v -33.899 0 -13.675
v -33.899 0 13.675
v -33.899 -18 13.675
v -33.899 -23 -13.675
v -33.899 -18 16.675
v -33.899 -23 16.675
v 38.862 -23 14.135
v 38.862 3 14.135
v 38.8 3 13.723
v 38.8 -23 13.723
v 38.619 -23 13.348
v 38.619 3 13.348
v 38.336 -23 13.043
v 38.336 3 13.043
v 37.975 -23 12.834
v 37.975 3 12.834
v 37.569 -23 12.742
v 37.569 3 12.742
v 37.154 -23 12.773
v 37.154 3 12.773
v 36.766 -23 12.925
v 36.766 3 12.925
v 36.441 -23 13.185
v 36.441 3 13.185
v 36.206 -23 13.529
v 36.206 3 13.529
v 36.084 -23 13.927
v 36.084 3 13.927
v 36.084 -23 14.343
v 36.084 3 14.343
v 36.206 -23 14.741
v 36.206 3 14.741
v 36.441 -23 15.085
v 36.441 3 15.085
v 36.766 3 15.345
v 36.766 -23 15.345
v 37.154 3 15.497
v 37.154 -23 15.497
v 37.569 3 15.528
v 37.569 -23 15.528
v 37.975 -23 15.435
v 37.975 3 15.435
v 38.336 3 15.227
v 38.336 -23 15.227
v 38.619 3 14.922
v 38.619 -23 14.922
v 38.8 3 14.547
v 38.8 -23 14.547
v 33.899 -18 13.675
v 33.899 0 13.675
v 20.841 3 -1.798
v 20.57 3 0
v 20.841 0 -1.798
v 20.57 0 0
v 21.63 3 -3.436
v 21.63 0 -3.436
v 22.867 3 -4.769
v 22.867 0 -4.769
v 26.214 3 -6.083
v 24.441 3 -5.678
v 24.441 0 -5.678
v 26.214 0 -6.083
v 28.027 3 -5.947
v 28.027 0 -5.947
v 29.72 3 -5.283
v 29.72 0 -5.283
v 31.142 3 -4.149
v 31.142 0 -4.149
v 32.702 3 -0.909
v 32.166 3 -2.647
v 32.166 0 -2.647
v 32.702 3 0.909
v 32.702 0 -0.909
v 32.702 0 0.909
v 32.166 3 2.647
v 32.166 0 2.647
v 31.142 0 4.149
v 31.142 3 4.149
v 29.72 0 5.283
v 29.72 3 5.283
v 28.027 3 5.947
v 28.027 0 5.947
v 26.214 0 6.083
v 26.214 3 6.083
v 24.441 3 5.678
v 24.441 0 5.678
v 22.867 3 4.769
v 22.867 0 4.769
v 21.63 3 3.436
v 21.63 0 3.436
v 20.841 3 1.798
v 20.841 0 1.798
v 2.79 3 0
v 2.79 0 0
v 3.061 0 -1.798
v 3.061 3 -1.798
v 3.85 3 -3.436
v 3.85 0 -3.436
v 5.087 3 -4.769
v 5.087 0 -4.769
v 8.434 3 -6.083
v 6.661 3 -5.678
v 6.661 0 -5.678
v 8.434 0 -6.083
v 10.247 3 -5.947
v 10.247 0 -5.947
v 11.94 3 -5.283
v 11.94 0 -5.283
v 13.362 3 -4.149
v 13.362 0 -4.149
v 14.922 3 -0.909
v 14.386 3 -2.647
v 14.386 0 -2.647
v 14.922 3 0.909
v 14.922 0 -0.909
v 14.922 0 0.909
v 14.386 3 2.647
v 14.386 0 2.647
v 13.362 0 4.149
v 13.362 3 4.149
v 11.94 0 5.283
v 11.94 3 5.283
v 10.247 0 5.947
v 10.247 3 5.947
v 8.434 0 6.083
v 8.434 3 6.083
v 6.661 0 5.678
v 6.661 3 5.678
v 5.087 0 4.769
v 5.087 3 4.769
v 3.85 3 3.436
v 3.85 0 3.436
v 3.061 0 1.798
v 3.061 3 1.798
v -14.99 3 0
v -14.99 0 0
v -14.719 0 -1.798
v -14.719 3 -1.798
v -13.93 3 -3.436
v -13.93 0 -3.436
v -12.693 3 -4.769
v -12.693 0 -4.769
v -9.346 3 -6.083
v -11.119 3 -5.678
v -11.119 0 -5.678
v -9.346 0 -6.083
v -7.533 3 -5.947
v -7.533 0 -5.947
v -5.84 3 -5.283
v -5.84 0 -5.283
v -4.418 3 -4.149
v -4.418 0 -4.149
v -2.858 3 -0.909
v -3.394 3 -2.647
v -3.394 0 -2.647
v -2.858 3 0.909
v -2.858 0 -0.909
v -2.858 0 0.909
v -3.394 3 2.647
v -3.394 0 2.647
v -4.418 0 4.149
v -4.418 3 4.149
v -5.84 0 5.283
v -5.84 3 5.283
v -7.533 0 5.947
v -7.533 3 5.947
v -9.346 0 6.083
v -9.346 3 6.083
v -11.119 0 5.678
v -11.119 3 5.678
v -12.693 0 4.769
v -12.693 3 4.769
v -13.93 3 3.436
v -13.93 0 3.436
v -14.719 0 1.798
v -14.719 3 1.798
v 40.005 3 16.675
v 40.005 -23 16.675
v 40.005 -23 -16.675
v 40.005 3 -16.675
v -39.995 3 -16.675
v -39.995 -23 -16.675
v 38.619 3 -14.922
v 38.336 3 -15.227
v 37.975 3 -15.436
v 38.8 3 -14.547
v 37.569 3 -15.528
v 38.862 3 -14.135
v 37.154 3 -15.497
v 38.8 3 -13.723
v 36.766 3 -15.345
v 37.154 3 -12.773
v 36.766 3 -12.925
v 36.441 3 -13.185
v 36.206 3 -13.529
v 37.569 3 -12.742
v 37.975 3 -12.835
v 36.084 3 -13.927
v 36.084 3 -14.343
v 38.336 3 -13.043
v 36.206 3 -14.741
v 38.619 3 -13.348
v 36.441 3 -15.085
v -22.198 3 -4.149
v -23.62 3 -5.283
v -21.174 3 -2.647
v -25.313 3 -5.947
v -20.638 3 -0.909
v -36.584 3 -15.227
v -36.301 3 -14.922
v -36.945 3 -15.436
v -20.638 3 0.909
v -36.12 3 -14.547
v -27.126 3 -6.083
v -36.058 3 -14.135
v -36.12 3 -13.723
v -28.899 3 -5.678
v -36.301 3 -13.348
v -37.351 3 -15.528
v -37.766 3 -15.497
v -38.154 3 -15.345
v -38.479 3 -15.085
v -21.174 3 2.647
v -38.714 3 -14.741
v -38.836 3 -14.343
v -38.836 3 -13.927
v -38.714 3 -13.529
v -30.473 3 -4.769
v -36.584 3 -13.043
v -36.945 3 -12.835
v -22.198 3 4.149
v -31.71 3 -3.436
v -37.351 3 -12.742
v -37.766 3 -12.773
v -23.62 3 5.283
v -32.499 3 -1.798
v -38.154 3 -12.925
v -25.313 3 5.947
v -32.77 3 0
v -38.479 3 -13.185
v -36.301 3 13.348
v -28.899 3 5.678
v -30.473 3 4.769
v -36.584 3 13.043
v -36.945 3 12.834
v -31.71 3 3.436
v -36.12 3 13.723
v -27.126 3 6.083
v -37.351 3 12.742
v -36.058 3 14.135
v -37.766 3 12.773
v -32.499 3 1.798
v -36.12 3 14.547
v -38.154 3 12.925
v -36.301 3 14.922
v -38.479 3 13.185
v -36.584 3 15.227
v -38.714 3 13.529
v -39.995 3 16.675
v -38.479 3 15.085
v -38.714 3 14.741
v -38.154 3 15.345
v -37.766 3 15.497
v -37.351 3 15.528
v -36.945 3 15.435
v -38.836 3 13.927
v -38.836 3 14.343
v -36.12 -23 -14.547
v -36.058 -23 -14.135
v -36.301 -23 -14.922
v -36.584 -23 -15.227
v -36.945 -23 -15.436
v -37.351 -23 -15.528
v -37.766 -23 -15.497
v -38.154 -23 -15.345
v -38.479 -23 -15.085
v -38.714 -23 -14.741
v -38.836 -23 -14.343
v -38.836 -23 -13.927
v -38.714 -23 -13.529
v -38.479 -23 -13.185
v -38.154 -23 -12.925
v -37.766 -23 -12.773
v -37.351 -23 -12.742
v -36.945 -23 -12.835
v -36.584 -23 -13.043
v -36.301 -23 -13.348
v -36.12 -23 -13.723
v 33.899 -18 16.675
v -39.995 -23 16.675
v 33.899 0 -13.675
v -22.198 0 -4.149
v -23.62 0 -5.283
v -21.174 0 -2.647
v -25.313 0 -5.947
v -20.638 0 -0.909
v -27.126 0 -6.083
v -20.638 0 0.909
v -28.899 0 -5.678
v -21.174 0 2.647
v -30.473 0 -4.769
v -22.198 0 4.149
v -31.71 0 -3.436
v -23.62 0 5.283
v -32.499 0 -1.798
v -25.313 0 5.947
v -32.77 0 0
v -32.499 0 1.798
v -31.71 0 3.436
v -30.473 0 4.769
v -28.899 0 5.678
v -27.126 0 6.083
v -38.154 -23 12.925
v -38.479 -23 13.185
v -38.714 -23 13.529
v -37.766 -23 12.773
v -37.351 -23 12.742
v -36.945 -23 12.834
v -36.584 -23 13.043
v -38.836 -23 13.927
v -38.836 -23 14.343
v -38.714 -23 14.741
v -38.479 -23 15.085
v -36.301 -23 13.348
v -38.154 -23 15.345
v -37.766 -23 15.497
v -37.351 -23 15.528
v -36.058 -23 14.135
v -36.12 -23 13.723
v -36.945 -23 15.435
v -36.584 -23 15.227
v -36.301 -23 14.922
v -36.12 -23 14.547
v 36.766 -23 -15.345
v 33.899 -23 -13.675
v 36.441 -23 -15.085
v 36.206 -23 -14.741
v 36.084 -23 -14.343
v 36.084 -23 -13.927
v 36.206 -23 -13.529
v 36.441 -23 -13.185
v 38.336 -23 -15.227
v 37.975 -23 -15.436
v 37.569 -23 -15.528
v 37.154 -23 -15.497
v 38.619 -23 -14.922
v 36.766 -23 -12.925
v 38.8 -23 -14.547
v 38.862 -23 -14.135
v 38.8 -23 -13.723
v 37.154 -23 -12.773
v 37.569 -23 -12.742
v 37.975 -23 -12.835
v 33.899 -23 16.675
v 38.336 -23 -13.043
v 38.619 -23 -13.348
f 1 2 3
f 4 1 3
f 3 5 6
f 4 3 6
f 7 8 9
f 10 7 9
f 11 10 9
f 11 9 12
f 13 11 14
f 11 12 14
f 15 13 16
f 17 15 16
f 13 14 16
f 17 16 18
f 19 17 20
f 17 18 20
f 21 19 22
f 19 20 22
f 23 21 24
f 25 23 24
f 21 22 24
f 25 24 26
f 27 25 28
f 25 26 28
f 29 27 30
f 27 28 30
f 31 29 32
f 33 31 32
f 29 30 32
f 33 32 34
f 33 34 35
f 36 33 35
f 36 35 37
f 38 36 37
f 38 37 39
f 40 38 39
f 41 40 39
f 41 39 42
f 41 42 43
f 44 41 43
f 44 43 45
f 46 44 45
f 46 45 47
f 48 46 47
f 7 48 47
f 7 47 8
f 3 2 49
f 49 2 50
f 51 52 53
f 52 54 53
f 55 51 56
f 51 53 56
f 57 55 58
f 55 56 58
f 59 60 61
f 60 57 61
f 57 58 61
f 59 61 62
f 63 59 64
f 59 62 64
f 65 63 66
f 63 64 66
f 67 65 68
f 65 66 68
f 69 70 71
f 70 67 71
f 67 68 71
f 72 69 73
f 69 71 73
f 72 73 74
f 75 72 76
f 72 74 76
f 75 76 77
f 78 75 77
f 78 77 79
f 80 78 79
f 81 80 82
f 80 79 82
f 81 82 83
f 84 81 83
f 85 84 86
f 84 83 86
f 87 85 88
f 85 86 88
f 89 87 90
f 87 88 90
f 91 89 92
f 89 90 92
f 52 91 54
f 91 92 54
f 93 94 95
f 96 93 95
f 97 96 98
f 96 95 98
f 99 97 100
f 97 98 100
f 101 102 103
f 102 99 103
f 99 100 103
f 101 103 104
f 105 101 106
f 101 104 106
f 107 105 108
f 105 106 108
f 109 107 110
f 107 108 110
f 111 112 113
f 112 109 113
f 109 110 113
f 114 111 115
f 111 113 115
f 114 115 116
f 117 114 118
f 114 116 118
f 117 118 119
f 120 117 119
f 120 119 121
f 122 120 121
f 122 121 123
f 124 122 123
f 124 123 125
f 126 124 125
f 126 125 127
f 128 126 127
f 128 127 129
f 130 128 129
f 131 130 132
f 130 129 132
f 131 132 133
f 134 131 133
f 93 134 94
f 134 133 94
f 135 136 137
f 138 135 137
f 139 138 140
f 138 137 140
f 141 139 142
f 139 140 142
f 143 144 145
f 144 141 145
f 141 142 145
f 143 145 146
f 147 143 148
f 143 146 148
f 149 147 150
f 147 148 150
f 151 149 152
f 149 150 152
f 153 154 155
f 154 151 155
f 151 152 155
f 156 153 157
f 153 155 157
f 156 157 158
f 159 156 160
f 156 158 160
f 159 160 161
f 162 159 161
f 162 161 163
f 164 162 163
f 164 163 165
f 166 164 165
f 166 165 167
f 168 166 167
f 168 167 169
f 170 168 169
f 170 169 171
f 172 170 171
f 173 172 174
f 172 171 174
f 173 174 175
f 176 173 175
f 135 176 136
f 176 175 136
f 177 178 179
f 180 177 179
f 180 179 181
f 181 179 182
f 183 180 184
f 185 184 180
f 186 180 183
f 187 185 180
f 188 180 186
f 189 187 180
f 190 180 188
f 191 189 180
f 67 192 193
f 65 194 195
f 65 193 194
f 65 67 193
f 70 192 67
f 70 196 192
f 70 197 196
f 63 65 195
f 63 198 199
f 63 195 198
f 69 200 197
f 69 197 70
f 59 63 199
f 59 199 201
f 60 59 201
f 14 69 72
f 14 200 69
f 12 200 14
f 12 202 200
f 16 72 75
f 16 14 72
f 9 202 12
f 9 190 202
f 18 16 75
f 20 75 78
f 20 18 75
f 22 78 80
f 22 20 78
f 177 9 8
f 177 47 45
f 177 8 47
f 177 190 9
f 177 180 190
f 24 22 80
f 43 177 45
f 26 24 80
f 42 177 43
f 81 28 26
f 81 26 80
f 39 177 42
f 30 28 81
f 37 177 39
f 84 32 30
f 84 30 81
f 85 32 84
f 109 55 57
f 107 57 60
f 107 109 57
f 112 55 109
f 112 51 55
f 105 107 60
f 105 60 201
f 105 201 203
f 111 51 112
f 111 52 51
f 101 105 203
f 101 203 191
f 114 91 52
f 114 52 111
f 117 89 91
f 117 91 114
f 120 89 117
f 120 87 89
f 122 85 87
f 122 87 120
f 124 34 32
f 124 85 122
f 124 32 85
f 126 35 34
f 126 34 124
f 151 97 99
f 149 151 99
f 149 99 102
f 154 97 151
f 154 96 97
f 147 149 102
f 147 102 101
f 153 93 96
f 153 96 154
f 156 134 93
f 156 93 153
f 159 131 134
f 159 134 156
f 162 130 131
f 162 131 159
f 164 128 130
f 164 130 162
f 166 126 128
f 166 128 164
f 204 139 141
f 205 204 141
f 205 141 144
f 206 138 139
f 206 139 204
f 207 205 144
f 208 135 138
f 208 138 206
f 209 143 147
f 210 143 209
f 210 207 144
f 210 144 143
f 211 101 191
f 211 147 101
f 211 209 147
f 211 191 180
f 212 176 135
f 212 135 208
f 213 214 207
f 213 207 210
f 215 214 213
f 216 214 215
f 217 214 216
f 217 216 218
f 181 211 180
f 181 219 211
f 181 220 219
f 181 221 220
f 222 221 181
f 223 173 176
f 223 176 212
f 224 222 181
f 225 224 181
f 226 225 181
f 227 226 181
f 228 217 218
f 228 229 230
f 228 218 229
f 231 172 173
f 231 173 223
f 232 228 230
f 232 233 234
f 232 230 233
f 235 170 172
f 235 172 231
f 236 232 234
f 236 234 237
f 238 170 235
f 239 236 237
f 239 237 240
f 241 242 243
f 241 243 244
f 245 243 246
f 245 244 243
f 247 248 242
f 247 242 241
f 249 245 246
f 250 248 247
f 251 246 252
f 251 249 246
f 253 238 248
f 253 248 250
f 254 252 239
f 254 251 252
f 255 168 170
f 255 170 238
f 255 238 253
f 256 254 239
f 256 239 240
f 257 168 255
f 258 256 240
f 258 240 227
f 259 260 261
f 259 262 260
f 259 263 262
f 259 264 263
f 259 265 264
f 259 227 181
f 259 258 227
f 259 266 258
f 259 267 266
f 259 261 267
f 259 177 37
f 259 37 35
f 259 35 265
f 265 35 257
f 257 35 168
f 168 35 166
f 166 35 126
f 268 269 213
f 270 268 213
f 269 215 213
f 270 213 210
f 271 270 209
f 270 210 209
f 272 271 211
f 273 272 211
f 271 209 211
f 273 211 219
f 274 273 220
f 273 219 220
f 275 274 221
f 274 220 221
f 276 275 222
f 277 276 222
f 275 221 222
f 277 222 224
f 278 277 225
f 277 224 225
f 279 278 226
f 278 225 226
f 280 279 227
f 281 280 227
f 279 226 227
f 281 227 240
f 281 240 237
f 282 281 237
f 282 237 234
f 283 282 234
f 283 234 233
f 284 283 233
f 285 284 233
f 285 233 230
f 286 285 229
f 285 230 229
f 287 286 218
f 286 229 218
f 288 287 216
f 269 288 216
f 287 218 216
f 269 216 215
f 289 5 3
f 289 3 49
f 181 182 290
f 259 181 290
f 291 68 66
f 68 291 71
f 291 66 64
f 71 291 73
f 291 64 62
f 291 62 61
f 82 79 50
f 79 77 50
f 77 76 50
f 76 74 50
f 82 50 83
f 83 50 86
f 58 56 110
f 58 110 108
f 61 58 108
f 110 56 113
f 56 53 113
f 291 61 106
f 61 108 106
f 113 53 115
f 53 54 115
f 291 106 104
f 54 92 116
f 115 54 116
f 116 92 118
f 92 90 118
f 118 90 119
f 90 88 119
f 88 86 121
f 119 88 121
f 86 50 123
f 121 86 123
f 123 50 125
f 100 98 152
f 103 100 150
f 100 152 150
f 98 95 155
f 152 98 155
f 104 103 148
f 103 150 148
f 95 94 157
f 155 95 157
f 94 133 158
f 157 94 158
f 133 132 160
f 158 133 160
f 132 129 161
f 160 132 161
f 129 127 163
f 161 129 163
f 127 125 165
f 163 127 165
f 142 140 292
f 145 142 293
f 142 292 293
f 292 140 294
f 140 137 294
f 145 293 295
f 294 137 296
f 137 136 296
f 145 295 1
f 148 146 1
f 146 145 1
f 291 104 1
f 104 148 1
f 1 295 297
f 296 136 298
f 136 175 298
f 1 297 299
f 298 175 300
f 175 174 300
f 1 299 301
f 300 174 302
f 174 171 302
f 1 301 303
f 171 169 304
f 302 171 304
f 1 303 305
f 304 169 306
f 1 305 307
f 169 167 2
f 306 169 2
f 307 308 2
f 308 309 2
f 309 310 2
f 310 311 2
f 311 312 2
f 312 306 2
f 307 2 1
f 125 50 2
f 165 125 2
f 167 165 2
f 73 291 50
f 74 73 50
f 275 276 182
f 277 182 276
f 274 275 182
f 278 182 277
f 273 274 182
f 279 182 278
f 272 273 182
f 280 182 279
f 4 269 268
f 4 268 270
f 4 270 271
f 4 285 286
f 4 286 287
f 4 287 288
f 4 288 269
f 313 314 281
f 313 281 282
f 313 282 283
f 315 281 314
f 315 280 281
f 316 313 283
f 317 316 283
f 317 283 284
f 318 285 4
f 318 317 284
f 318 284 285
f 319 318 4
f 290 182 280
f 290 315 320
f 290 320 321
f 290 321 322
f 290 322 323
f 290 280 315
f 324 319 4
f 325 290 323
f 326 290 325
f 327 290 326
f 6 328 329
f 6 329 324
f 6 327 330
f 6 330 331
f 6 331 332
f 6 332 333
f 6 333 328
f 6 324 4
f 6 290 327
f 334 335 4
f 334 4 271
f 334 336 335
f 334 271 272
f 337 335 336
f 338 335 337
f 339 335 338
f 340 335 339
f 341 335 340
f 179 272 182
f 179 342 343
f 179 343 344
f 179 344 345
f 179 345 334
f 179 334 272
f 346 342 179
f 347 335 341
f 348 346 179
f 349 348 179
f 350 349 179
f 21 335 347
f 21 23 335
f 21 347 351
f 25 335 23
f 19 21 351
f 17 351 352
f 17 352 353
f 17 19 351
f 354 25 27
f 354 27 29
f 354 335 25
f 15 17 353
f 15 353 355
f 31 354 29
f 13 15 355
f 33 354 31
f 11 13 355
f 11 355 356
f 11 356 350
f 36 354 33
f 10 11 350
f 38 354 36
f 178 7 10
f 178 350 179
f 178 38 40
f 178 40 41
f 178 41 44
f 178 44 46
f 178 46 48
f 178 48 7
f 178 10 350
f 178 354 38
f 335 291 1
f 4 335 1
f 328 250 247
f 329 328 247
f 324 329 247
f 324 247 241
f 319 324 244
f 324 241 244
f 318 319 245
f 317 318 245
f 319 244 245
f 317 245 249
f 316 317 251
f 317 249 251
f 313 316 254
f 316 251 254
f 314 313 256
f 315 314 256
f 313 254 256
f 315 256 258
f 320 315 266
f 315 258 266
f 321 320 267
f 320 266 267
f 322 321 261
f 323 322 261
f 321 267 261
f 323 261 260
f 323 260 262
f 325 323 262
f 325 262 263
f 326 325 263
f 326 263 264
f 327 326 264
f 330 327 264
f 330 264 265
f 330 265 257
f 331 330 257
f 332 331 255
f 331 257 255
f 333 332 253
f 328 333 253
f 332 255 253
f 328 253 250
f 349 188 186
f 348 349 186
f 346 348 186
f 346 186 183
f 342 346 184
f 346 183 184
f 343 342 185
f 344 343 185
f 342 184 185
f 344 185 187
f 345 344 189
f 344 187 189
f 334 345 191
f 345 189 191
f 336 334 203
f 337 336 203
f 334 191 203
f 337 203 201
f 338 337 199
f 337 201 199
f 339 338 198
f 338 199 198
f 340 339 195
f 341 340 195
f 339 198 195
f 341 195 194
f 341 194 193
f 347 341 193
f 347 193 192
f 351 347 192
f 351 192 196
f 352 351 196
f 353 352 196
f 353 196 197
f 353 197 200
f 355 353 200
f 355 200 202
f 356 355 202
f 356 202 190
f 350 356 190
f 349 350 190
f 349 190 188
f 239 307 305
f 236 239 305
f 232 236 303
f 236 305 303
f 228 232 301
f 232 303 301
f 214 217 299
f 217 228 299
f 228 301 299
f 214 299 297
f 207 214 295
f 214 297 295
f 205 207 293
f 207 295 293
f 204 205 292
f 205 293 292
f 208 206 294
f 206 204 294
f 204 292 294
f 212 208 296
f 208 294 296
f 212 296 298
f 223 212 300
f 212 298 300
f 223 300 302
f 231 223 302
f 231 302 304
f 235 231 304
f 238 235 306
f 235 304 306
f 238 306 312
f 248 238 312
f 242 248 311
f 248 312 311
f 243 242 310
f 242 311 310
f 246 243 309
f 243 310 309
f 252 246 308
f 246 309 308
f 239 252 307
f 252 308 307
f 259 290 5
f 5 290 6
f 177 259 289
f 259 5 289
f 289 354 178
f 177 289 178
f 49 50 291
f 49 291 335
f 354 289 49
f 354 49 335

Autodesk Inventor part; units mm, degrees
ref_plane "YZ Plane" through (0, 0, 0) normal (1, 0, 0) x (0, 1, 0)
ref_plane "XZ Plane" through (0, 0, 0) normal (0, 1, 0) x (-1, 0, 0)
ref_plane "XY Plane" through (0, 0, 0) normal (0, 0, 1) x (1, 0, 0)
sketch "Sketch1" plane through (0, 0, 0) normal (0, 1, 0) x (-1, 0, 0)
  line L0 (39.995, 16.6749) -> (-40.005, 16.6749)
  line L1 (-40.005, 16.6749) -> (-40.005, -16.6751)
  line L2 (-40.005, -16.6751) -> (39.995, -16.6751)
  line L3 (39.995, -16.6751) -> (39.995, 16.6749)
  circle A0 centre (-26.67, -0.0001) radius 6.1
  circle A1 centre (-8.89, -0.0001) radius 6.1
  circle A2 centre (8.89, -0.0001) radius 6.1
  circle A3 centre (26.67, -0.0001) radius 6.1
  point P0 (0, 0)
  dimension "d0" = 33.35
  dimension "d1" = 80
  dimension "d2" = 16.6751
  dimension "d3" = 40.005
  dimension "d4" = 12.2
  dimension "d5" = 13.335
  dimension "d8" = 17.78
extrude "Extrusion1" add sketch "Sketch1" along normal blind 3
sketch "Sketch2" plane through (0, 0, 0) normal (0, -1, 0) x (1, 0, 0)
  circle A0 centre (-26.67, -0.0001) radius 6.1 projected
  circle A1 centre (-8.89, -0.0001) radius 6.1 projected
  circle A2 centre (8.89, -0.0001) radius 6.1 projected
  circle A3 centre (26.67, -0.0001) radius 6.1 projected
  line L0 (-39.995, -16.6751) -> (-39.995, 16.6749) projected
  line L1 (-39.995, 16.6749) -> (40.005, 16.6749) projected
  line L2 (40.005, 16.6749) -> (40.005, -16.6751) projected
  line L3 (40.005, -16.6751) -> (-39.995, -16.6751) projected
  line L4 (33.899, -13.6749) -> (-33.899, -13.6749)
  line L5 (-33.899, -13.6749) -> (-33.899, 13.6749)
  line L6 (-33.899, 13.6749) -> (33.899, 13.6749)
  line L7 (33.899, 13.6749) -> (33.899, -13.6749)
  line L8 (33.899, -13.6749) -> (-33.899, 13.6749) construction
  line L9 (-33.899, -13.6749) -> (33.899, 13.6749) construction
  point P0 (0, 0)
  dimension "d15" = 6.096
  dimension "d16" = 6.106
  dimension "d17" = 3
  dimension "d18" = 7.229
extrude "Extrusion2" add sketch "Sketch2" along normal blind 23 contours L0 L1 L2 L3
sketch "Sketch4" plane through (-39.995, 3, 16.6749) normal (0, 0, 1) x (1, 0, 0)
  line L0 (80, -26) -> (0, -26) projected
  line L1 (0, -26) -> (0, 0) projected
  line L2 (0, 0) -> (80, 0) projected
  line L3 (80, 0) -> (80, -26) projected
  line L4 (0, 0) -> (80, 0) projected
  line L5 (6.096, 0) -> (6.096, -26)
  line L6 (73.894, 0) -> (73.894, -26)
  line L7 (73.894, -3) -> (73.894, -26) projected
  line L8 (6.096, -21) -> (73.894, -21)
  point P0 (39.995, -3)
  dimension "d21" = 6.096
  dimension "d22" = 6.106
  dimension "d23" = 5
extrude "Extrusion3" cut sketch "Sketch4" against normal blind 23 contours L0 L5 L8 L6
sketch "Sketch5" plane through (0, 3, 0) normal (0, 1, 0) x (1, 0, 0)
  circle A0 centre (-26.67, 0.0001) radius 6.1 projected
  circle A1 centre (-8.89, 0.0001) radius 6.1 projected
  circle A2 centre (8.89, 0.0001) radius 6.1 projected
  circle A3 centre (26.67, 0.0001) radius 6.1 projected
  line L0 (-39.995, -16.6749) -> (-39.995, 16.6751) projected
  line L1 (-39.995, 16.6751) -> (40.005, 16.6751) projected
  line L2 (40.005, 16.6751) -> (40.005, -16.6749) projected
  line L3 (40.005, -16.6749) -> (-39.995, -16.6749) projected
  line L4 (-33.899, 13.6749) -> (-33.899, -16.6749) projected
  line L5 (33.899, -13.6749) -> (-33.899, -13.6749) projected
  line L6 (33.899, 13.6749) -> (-33.899, 13.6749) projected
  line L7 (33.899, -16.6749) -> (33.899, 13.6749) projected
  line L8 (-33.67, -12.4999) -> (-19.67, -12.4999)
  line L9 (-19.67, -12.4999) -> (-19.67, 12.5001)
  line L10 (-19.67, 12.5001) -> (-33.67, 12.5001)
  line L11 (-33.67, 12.5001) -> (-33.67, -12.4999)
  line L12 (-33.67, -12.4999) -> (-19.67, 12.5001) construction
  line L13 (-19.67, -12.4999) -> (-33.67, 12.5001) construction
  line L14 (-15.89, -12.4999) -> (-1.89, -12.4999)
  line L15 (-1.89, -12.4999) -> (-1.89, 12.5001)
  line L16 (-1.89, 12.5001) -> (-15.89, 12.5001)
  line L17 (-15.89, 12.5001) -> (-15.89, -12.4999)
  line L18 (1.89, -12.4999) -> (15.89, -12.4999)
  line L19 (15.89, -12.4999) -> (15.89, 12.5001)
  line L20 (15.89, 12.5001) -> (1.89, 12.5001)
  line L21 (1.89, 12.5001) -> (1.89, -12.4999)
  line L22 (19.67, -12.4999) -> (33.67, -12.4999)
  line L23 (33.67, -12.4999) -> (33.67, 12.5001)
  line L24 (33.67, 12.5001) -> (19.67, 12.5001)
  line L25 (19.67, 12.5001) -> (19.67, -12.4999)
  circle A4 centre (-37.455, -14.1349) radius 1.397
  line L26 (0.005, -16.6749) -> (0.005, 16.6751)
  line L27 (-1.89, 0.0001) -> (1.89, 0.0001)
  circle A5 centre (37.465, -14.1349) radius 1.397
  circle A6 centre (-37.455, 14.1351) radius 1.397
  circle A7 centre (37.465, 14.1351) radius 1.397
  point P0 (0, 0)
  dimension "d26" = 13.335
  dimension "d27" = 7.229
  dimension "d28" = 14
  dimension "d29" = 25
  dimension "d30" = 0.229
  dimension "d33" = 17.78
  dimension "d38" = 3.78
  dimension "d39" = 6.325
  dimension "d40" = 2.794
  dimension "d41" = 2.54
  dimension "d44" = 2.54
  dimension "d45" = 2.54
extrude "Extrusion4" cut sketch "Sketch5" against normal blind 50.8 contours A4 | A5 | A6 | A7
properties part number "SwitchPanel"
